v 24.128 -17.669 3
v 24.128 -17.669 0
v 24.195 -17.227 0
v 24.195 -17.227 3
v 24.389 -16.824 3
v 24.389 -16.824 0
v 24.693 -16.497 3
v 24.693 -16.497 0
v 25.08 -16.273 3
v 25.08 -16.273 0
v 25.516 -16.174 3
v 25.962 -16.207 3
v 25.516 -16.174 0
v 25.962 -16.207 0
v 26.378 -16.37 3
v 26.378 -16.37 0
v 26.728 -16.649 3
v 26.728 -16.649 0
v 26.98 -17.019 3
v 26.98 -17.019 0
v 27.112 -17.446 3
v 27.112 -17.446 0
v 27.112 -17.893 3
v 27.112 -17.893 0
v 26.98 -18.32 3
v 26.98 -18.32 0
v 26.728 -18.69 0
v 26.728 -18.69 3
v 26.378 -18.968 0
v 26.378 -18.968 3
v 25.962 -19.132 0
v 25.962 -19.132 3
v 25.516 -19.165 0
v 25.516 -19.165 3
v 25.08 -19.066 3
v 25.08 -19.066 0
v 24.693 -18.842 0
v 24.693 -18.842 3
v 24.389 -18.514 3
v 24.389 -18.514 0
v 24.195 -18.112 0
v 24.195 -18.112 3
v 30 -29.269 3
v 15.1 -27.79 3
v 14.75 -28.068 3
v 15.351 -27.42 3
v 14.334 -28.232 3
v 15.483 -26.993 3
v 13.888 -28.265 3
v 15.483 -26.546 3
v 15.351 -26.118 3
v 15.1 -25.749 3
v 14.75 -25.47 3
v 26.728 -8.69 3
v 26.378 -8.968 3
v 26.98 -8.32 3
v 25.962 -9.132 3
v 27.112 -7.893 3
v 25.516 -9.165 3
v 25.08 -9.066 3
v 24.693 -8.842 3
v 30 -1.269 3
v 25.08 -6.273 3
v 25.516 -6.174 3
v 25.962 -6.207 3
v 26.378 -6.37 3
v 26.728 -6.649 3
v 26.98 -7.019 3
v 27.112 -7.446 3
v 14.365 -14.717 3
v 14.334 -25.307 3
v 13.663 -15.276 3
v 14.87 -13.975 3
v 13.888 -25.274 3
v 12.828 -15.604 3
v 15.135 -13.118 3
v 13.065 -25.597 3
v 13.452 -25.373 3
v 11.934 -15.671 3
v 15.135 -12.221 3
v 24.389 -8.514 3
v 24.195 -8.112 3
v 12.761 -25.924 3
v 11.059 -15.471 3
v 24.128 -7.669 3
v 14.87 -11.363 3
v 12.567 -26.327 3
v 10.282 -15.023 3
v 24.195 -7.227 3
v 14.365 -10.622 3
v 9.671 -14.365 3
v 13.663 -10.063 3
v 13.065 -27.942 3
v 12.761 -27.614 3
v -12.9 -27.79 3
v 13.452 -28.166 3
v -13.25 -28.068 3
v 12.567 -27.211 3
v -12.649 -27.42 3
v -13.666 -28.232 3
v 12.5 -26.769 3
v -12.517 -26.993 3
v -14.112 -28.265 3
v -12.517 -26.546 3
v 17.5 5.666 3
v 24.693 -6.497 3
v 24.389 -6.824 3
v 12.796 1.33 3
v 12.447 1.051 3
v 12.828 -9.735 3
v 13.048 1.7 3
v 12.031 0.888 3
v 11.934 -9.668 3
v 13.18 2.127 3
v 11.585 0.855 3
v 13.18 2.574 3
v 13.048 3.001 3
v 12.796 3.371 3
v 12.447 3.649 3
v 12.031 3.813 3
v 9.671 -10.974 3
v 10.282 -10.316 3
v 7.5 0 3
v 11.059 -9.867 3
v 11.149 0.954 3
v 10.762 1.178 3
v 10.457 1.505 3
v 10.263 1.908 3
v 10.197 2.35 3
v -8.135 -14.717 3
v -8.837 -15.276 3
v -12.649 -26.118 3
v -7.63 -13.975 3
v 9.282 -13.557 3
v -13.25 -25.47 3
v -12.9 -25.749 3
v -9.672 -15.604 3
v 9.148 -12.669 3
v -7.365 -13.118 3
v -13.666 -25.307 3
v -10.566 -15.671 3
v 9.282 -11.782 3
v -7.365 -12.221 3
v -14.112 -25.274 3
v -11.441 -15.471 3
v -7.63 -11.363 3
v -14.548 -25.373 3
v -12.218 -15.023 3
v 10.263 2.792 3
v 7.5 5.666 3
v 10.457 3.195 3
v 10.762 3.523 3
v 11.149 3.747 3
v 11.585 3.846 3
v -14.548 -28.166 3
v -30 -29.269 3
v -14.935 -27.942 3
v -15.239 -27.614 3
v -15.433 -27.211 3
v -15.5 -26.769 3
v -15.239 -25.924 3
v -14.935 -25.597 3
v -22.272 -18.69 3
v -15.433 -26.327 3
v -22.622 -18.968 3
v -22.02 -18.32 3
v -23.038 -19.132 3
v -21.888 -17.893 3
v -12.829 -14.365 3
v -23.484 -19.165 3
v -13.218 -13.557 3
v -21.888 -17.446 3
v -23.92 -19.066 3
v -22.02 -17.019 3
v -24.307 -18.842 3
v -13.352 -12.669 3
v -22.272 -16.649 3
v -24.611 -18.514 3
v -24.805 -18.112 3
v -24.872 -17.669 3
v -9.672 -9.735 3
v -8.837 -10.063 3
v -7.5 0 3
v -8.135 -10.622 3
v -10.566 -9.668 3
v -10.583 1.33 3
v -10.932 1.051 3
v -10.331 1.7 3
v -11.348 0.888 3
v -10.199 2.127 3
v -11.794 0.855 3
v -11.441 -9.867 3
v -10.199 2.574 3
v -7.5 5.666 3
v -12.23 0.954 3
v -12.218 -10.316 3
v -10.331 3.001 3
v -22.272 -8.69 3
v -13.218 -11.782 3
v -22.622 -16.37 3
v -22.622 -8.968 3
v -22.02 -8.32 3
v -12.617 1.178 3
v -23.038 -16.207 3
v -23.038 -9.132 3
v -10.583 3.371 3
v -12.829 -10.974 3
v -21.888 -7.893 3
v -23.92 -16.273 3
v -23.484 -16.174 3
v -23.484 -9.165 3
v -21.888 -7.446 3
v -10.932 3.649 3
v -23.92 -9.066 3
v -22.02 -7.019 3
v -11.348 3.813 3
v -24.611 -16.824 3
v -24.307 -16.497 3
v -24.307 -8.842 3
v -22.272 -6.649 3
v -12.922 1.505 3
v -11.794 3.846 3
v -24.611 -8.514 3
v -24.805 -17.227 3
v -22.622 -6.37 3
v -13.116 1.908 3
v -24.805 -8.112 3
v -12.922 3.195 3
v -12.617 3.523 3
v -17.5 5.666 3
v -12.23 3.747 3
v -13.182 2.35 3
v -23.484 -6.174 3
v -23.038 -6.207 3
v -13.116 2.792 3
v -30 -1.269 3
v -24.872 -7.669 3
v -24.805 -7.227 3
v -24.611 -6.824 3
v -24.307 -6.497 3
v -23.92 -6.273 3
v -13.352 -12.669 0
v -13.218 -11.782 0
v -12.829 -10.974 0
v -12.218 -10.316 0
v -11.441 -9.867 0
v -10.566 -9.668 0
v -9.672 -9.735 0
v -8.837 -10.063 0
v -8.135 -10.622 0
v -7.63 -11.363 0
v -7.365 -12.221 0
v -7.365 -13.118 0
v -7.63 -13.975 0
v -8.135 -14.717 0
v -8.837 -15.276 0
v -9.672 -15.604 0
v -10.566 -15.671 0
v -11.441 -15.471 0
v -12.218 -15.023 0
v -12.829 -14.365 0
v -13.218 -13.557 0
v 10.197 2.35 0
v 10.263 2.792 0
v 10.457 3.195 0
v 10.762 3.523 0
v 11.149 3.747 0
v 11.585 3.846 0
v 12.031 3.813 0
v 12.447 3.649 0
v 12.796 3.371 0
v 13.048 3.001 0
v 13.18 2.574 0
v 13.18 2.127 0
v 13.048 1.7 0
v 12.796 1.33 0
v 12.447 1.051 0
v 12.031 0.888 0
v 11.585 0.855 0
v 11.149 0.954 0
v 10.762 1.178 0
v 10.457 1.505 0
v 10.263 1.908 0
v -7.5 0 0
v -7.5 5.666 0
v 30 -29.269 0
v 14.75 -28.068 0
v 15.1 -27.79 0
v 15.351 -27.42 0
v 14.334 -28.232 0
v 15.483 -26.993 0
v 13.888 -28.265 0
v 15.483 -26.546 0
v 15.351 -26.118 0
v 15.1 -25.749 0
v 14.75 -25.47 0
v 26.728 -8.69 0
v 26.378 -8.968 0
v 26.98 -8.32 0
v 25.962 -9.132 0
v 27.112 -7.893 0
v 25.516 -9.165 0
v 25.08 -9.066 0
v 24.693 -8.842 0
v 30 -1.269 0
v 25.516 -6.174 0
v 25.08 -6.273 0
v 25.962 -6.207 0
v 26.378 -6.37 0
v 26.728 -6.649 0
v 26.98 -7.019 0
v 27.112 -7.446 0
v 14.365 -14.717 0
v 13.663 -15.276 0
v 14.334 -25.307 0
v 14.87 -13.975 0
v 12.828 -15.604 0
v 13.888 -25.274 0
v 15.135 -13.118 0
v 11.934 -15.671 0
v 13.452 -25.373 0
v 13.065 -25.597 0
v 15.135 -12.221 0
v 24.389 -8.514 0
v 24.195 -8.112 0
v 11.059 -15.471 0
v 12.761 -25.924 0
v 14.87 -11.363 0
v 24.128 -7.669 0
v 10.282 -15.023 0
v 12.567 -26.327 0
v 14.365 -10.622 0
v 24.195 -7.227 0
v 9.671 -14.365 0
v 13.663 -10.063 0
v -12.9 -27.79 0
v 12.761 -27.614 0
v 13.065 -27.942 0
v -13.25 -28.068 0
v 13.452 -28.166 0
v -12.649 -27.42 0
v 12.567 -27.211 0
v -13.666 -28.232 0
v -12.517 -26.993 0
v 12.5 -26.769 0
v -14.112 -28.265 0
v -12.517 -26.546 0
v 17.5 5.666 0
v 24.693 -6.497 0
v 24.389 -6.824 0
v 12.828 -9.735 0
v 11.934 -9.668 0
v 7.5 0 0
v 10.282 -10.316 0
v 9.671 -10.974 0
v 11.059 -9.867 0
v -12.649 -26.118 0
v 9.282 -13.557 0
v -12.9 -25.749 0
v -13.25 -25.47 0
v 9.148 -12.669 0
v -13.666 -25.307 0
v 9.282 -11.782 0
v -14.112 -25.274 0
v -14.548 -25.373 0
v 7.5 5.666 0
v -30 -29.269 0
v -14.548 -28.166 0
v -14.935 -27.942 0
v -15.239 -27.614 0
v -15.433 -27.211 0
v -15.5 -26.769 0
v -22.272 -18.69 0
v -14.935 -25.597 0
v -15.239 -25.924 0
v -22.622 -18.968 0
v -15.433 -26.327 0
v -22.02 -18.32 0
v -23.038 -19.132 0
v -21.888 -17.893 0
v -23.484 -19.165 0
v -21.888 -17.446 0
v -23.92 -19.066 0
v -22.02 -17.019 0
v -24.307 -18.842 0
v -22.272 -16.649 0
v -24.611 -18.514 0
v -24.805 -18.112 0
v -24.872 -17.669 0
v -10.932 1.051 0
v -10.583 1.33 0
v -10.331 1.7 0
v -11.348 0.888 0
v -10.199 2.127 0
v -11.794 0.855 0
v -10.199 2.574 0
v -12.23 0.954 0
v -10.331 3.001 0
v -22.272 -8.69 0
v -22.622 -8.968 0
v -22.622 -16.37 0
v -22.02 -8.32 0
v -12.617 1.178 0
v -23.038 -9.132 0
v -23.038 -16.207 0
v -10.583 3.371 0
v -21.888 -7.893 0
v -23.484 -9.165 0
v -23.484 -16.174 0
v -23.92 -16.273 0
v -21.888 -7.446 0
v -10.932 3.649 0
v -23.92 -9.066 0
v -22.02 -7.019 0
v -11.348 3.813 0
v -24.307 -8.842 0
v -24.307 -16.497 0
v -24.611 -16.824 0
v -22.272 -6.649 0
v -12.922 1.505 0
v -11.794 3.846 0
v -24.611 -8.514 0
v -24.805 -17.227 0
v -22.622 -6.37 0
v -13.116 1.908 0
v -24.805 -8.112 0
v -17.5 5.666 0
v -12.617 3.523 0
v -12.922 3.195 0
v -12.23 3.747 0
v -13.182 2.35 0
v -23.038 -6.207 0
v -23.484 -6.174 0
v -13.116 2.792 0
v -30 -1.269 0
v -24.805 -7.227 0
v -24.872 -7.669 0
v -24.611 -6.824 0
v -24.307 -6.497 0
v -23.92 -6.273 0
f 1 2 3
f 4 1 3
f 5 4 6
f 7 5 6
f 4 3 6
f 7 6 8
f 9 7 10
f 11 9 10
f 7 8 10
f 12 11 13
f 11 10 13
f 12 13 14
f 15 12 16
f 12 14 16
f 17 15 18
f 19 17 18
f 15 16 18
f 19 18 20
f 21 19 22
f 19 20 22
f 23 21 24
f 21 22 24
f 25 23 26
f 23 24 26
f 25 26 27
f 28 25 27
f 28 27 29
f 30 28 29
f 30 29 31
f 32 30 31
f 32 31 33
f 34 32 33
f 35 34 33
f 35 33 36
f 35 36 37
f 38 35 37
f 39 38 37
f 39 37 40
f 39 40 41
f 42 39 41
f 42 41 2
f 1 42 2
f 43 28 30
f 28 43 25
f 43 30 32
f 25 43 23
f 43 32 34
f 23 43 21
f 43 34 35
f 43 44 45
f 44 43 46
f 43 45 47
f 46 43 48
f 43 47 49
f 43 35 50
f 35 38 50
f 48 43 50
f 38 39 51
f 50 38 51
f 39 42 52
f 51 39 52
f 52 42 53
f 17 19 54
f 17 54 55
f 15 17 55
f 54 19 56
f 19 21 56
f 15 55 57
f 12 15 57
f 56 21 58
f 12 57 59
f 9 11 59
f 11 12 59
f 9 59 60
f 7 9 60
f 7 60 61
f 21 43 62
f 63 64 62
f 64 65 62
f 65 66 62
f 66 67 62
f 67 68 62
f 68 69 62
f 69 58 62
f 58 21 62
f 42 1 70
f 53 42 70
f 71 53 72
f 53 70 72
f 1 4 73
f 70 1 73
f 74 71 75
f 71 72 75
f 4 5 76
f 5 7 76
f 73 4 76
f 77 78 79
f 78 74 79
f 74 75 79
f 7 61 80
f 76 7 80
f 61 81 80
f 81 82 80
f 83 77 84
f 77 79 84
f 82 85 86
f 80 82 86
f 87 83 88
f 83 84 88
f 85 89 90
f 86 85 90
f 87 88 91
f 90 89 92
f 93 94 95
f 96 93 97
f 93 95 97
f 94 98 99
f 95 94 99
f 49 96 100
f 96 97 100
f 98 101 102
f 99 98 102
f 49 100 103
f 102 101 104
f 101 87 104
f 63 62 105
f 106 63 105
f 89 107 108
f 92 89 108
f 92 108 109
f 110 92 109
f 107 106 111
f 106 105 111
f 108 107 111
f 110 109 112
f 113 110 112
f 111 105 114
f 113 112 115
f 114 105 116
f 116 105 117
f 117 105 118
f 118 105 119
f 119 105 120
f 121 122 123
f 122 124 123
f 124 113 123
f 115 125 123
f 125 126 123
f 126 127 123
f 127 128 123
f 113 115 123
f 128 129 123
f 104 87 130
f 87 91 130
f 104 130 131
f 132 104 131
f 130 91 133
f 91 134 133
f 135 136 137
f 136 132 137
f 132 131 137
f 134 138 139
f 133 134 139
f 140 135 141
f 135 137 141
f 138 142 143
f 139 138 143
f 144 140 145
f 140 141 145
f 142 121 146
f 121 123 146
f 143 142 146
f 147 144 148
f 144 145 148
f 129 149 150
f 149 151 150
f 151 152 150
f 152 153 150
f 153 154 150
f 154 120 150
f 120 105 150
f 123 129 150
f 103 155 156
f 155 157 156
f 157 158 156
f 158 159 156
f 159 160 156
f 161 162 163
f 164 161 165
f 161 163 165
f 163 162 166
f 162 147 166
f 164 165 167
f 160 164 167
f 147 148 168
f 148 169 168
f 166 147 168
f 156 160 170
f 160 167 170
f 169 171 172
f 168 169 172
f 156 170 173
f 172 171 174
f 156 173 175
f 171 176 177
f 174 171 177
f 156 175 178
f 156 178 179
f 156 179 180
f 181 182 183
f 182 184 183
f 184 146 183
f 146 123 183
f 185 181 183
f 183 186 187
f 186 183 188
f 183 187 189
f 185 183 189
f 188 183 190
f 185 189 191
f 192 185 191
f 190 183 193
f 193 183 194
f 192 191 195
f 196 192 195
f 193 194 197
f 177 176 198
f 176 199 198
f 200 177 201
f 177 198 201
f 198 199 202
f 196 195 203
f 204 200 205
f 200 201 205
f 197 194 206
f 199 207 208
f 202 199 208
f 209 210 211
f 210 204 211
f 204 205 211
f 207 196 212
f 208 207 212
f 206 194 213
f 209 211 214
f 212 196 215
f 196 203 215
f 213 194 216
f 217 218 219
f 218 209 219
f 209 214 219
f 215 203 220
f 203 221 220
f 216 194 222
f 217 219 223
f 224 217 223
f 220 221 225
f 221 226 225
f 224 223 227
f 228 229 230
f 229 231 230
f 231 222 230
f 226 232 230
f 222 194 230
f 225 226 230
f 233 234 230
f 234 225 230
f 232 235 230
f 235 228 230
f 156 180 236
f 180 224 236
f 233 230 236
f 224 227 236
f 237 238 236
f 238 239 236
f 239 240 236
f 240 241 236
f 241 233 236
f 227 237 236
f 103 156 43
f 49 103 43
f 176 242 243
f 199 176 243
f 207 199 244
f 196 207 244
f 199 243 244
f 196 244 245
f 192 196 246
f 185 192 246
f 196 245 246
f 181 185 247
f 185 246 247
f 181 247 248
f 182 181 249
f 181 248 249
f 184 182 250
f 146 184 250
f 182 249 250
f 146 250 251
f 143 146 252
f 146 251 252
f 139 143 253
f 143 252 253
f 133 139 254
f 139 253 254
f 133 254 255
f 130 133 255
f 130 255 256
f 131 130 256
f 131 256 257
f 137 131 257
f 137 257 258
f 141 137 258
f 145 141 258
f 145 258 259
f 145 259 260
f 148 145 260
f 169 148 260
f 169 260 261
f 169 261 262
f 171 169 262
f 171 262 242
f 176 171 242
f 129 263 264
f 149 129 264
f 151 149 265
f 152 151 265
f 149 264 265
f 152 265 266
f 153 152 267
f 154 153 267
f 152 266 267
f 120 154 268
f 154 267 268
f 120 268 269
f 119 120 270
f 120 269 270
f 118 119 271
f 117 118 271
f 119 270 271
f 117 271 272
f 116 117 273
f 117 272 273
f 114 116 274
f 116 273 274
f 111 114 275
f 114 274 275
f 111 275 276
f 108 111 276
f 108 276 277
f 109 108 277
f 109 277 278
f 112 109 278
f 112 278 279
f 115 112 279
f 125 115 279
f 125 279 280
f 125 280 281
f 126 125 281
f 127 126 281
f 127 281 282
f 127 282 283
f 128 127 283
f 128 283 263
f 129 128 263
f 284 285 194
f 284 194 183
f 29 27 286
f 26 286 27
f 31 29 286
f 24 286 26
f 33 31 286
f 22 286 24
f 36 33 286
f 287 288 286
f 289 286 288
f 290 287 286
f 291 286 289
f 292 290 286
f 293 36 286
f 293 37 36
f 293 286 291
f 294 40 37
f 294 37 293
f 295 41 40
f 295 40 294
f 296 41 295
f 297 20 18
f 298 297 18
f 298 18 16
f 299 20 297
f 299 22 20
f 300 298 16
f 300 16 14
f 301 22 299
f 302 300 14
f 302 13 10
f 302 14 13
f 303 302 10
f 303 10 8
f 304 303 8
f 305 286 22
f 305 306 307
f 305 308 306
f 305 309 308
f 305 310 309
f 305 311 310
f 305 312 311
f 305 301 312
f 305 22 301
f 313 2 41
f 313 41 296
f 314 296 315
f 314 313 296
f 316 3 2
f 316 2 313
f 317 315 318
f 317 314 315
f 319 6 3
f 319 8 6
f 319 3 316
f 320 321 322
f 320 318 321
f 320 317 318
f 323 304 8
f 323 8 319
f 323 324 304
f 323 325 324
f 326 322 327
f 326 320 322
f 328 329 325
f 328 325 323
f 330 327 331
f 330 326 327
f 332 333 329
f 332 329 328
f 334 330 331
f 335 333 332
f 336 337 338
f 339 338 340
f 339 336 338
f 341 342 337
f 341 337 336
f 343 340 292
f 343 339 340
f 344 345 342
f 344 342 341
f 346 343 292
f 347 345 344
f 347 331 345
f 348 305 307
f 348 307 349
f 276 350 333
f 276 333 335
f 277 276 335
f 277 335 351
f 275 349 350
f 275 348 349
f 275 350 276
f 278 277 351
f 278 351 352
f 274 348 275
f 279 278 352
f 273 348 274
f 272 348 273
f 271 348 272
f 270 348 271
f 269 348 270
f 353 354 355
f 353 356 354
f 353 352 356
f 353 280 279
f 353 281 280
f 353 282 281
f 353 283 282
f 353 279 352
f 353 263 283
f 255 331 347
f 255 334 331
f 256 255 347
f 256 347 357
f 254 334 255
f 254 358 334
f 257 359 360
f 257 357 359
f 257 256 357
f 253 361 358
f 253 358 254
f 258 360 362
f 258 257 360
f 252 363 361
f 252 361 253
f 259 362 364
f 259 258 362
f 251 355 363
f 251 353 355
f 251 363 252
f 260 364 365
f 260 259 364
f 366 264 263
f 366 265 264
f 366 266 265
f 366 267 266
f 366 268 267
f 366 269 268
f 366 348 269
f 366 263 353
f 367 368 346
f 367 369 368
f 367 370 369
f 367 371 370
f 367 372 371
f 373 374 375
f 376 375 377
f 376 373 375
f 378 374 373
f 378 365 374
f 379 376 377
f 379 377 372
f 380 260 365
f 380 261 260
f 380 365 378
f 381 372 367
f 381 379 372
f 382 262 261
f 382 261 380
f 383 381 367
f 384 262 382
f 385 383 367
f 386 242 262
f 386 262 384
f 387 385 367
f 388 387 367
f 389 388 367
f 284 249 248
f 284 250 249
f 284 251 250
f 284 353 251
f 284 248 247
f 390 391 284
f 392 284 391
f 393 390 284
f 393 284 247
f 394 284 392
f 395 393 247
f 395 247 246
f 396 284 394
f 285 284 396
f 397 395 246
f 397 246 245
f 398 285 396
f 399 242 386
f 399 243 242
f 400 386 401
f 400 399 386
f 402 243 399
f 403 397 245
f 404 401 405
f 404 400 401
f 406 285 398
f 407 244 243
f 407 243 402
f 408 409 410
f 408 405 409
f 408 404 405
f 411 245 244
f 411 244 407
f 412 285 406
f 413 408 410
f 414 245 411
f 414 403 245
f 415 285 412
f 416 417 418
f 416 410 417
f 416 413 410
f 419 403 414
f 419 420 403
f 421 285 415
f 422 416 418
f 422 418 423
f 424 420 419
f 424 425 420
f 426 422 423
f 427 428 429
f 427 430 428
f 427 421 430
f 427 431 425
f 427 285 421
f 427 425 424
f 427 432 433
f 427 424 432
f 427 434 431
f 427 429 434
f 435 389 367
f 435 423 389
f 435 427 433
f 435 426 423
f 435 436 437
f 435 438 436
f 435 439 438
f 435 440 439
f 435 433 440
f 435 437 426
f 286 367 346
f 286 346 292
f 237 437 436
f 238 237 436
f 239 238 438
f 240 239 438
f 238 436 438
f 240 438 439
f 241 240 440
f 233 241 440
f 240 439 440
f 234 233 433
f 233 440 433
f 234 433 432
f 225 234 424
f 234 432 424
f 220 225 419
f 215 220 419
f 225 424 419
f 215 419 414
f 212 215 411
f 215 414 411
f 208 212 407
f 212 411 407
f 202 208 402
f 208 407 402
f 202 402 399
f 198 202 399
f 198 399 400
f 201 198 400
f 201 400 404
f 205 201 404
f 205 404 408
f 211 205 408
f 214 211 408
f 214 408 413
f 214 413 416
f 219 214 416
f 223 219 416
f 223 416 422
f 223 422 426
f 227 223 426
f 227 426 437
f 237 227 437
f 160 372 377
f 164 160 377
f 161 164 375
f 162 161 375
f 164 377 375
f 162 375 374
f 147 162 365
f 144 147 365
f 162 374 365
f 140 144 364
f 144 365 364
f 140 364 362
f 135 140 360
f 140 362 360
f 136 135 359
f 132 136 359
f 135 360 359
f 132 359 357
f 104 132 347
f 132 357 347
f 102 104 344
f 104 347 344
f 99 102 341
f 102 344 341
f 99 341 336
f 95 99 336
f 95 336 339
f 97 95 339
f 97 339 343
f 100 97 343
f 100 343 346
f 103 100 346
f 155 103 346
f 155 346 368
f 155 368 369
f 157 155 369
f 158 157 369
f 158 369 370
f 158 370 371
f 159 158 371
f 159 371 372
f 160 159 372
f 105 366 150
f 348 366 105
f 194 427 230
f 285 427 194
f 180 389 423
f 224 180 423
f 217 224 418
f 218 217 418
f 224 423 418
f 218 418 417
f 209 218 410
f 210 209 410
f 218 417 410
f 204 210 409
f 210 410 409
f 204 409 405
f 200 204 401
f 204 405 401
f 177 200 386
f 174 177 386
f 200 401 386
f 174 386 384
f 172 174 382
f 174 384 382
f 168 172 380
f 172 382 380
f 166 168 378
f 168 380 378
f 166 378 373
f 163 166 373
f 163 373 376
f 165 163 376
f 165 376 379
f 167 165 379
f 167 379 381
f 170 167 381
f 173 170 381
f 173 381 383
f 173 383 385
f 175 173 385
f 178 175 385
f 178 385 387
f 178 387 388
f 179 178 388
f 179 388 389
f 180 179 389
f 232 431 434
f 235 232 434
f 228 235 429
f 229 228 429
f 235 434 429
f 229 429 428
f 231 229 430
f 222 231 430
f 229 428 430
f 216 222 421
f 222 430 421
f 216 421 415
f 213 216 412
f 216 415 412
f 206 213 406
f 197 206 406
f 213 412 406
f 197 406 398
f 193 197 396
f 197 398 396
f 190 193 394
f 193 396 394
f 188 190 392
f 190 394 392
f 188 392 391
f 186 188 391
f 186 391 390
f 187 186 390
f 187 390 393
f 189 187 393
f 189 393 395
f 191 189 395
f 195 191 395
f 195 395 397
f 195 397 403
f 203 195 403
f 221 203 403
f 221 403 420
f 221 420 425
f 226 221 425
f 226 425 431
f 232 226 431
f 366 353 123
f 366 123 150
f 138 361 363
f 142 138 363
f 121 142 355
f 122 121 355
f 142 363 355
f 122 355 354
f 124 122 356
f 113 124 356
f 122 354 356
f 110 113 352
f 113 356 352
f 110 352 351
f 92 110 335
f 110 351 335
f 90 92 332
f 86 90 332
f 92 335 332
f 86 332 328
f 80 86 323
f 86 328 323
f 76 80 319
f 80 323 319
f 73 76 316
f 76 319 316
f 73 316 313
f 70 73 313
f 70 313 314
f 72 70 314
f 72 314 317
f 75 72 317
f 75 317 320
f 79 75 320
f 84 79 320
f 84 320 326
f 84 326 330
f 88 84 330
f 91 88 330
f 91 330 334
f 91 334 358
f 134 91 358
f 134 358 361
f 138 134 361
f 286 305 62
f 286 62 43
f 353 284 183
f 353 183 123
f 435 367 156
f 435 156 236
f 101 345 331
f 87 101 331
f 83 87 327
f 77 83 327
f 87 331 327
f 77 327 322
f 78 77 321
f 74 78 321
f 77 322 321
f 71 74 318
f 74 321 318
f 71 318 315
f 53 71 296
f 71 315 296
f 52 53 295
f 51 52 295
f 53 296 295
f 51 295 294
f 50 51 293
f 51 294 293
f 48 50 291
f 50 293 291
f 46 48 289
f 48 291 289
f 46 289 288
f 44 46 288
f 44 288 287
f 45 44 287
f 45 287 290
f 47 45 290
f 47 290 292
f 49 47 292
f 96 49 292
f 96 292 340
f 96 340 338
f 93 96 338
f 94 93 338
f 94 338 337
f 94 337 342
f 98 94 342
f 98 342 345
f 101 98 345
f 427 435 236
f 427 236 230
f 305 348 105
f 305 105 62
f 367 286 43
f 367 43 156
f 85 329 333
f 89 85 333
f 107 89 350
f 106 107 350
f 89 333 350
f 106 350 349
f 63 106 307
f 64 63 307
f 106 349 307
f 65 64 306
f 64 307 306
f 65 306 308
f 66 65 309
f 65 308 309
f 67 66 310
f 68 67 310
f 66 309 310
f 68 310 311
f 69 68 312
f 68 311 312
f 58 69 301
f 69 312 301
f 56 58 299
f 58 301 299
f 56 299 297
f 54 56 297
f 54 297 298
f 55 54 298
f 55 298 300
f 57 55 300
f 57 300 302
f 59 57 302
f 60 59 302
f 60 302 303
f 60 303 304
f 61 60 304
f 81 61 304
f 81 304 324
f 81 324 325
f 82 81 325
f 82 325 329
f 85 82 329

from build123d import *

# Parameters (mm, degrees)
EXTRUDE_1_DEPTH      = 3
SKETCH_2_R           = 1.5
CUT_EXTRUDE_7_DEPTH  = 43.02014847
SKETCH_4_R           = 1.5
CUT_EXTRUDE_8_DEPTH  = 43.02014847
SKETCH_5_R           = 3.01
CUT_EXTRUDE_9_DEPTH  = 43.02014847
SKETCH_6_R           = 1.5
CUT_EXTRUDE_10_DEPTH = 43.02014847


with BuildPart() as part:
    # 草图1 → 凸台-拉伸1 (new body)
    with BuildSketch(Plane.XY):
        Polygon((-7.5, 0), (7.5, 0), (7.5, 5.665837688), (17.5, 5.665837688), (30, -1.269316313), (30, -29.269316313), (-30, -29.269316313), (-30, -1.269316313), (-17.5, 5.665837688), (-7.5, 5.665837688), align=None)
    extrude(amount=EXTRUDE_1_DEPTH)

    # 草图2 → 切除-拉伸7 (cut, through all)
    with BuildSketch(Plane(origin=(0, 0, 0), x_dir=(-1, 0, 0), z_dir=(0, 0, -1))):
        with Locations((-25.62844718, -17.669380188)):
            Circle(SKETCH_2_R)
        with Locations((-25.62844718, -7.669380188)):
            Circle(SKETCH_2_R)
        with Locations((23.37155282, -17.669380188)):
            Circle(SKETCH_2_R)
        with Locations((23.37155282, -7.669380188)):
            Circle(SKETCH_2_R)
    extrude(amount=-CUT_EXTRUDE_7_DEPTH, mode=Mode.SUBTRACT)

    # 草图4 → 切除-拉伸8 (cut, through all)
    with BuildSketch(Plane(origin=(0, 0, 0), x_dir=(-1, 0, 0), z_dir=(0, 0, -1))):
        with Locations((-11.696832964, 2.350343297)):
            Circle(SKETCH_4_R)
        with Locations((11.682164636, 2.350343297)):
            Circle(SKETCH_4_R)
    extrude(amount=-CUT_EXTRUDE_8_DEPTH, mode=Mode.SUBTRACT)

    # 草图5 → 切除-拉伸9 (cut, through all)
    with BuildSketch(Plane(origin=(0, 0, 0), x_dir=(-1, 0, 0), z_dir=(0, 0, -1))):
        with Locations((10.34155282, -12.669316313)):
            Circle(SKETCH_5_R)
        with Locations((-12.15844718, -12.669380188)):
            Circle(SKETCH_5_R)
    extrude(amount=-CUT_EXTRUDE_9_DEPTH, mode=Mode.SUBTRACT)

    # 草图6 → 切除-拉伸10 (cut, through all)
    with BuildSketch(Plane(origin=(0, 0, 0), x_dir=(-1, 0, 0), z_dir=(0, 0, -1))):
        with Locations((14, -26.769316313)):
            Circle(SKETCH_6_R)
        with Locations((-14, -26.769316313)):
            Circle(SKETCH_6_R)
    extrude(amount=-CUT_EXTRUDE_10_DEPTH, mode=Mode.SUBTRACT)


solid = part.part
